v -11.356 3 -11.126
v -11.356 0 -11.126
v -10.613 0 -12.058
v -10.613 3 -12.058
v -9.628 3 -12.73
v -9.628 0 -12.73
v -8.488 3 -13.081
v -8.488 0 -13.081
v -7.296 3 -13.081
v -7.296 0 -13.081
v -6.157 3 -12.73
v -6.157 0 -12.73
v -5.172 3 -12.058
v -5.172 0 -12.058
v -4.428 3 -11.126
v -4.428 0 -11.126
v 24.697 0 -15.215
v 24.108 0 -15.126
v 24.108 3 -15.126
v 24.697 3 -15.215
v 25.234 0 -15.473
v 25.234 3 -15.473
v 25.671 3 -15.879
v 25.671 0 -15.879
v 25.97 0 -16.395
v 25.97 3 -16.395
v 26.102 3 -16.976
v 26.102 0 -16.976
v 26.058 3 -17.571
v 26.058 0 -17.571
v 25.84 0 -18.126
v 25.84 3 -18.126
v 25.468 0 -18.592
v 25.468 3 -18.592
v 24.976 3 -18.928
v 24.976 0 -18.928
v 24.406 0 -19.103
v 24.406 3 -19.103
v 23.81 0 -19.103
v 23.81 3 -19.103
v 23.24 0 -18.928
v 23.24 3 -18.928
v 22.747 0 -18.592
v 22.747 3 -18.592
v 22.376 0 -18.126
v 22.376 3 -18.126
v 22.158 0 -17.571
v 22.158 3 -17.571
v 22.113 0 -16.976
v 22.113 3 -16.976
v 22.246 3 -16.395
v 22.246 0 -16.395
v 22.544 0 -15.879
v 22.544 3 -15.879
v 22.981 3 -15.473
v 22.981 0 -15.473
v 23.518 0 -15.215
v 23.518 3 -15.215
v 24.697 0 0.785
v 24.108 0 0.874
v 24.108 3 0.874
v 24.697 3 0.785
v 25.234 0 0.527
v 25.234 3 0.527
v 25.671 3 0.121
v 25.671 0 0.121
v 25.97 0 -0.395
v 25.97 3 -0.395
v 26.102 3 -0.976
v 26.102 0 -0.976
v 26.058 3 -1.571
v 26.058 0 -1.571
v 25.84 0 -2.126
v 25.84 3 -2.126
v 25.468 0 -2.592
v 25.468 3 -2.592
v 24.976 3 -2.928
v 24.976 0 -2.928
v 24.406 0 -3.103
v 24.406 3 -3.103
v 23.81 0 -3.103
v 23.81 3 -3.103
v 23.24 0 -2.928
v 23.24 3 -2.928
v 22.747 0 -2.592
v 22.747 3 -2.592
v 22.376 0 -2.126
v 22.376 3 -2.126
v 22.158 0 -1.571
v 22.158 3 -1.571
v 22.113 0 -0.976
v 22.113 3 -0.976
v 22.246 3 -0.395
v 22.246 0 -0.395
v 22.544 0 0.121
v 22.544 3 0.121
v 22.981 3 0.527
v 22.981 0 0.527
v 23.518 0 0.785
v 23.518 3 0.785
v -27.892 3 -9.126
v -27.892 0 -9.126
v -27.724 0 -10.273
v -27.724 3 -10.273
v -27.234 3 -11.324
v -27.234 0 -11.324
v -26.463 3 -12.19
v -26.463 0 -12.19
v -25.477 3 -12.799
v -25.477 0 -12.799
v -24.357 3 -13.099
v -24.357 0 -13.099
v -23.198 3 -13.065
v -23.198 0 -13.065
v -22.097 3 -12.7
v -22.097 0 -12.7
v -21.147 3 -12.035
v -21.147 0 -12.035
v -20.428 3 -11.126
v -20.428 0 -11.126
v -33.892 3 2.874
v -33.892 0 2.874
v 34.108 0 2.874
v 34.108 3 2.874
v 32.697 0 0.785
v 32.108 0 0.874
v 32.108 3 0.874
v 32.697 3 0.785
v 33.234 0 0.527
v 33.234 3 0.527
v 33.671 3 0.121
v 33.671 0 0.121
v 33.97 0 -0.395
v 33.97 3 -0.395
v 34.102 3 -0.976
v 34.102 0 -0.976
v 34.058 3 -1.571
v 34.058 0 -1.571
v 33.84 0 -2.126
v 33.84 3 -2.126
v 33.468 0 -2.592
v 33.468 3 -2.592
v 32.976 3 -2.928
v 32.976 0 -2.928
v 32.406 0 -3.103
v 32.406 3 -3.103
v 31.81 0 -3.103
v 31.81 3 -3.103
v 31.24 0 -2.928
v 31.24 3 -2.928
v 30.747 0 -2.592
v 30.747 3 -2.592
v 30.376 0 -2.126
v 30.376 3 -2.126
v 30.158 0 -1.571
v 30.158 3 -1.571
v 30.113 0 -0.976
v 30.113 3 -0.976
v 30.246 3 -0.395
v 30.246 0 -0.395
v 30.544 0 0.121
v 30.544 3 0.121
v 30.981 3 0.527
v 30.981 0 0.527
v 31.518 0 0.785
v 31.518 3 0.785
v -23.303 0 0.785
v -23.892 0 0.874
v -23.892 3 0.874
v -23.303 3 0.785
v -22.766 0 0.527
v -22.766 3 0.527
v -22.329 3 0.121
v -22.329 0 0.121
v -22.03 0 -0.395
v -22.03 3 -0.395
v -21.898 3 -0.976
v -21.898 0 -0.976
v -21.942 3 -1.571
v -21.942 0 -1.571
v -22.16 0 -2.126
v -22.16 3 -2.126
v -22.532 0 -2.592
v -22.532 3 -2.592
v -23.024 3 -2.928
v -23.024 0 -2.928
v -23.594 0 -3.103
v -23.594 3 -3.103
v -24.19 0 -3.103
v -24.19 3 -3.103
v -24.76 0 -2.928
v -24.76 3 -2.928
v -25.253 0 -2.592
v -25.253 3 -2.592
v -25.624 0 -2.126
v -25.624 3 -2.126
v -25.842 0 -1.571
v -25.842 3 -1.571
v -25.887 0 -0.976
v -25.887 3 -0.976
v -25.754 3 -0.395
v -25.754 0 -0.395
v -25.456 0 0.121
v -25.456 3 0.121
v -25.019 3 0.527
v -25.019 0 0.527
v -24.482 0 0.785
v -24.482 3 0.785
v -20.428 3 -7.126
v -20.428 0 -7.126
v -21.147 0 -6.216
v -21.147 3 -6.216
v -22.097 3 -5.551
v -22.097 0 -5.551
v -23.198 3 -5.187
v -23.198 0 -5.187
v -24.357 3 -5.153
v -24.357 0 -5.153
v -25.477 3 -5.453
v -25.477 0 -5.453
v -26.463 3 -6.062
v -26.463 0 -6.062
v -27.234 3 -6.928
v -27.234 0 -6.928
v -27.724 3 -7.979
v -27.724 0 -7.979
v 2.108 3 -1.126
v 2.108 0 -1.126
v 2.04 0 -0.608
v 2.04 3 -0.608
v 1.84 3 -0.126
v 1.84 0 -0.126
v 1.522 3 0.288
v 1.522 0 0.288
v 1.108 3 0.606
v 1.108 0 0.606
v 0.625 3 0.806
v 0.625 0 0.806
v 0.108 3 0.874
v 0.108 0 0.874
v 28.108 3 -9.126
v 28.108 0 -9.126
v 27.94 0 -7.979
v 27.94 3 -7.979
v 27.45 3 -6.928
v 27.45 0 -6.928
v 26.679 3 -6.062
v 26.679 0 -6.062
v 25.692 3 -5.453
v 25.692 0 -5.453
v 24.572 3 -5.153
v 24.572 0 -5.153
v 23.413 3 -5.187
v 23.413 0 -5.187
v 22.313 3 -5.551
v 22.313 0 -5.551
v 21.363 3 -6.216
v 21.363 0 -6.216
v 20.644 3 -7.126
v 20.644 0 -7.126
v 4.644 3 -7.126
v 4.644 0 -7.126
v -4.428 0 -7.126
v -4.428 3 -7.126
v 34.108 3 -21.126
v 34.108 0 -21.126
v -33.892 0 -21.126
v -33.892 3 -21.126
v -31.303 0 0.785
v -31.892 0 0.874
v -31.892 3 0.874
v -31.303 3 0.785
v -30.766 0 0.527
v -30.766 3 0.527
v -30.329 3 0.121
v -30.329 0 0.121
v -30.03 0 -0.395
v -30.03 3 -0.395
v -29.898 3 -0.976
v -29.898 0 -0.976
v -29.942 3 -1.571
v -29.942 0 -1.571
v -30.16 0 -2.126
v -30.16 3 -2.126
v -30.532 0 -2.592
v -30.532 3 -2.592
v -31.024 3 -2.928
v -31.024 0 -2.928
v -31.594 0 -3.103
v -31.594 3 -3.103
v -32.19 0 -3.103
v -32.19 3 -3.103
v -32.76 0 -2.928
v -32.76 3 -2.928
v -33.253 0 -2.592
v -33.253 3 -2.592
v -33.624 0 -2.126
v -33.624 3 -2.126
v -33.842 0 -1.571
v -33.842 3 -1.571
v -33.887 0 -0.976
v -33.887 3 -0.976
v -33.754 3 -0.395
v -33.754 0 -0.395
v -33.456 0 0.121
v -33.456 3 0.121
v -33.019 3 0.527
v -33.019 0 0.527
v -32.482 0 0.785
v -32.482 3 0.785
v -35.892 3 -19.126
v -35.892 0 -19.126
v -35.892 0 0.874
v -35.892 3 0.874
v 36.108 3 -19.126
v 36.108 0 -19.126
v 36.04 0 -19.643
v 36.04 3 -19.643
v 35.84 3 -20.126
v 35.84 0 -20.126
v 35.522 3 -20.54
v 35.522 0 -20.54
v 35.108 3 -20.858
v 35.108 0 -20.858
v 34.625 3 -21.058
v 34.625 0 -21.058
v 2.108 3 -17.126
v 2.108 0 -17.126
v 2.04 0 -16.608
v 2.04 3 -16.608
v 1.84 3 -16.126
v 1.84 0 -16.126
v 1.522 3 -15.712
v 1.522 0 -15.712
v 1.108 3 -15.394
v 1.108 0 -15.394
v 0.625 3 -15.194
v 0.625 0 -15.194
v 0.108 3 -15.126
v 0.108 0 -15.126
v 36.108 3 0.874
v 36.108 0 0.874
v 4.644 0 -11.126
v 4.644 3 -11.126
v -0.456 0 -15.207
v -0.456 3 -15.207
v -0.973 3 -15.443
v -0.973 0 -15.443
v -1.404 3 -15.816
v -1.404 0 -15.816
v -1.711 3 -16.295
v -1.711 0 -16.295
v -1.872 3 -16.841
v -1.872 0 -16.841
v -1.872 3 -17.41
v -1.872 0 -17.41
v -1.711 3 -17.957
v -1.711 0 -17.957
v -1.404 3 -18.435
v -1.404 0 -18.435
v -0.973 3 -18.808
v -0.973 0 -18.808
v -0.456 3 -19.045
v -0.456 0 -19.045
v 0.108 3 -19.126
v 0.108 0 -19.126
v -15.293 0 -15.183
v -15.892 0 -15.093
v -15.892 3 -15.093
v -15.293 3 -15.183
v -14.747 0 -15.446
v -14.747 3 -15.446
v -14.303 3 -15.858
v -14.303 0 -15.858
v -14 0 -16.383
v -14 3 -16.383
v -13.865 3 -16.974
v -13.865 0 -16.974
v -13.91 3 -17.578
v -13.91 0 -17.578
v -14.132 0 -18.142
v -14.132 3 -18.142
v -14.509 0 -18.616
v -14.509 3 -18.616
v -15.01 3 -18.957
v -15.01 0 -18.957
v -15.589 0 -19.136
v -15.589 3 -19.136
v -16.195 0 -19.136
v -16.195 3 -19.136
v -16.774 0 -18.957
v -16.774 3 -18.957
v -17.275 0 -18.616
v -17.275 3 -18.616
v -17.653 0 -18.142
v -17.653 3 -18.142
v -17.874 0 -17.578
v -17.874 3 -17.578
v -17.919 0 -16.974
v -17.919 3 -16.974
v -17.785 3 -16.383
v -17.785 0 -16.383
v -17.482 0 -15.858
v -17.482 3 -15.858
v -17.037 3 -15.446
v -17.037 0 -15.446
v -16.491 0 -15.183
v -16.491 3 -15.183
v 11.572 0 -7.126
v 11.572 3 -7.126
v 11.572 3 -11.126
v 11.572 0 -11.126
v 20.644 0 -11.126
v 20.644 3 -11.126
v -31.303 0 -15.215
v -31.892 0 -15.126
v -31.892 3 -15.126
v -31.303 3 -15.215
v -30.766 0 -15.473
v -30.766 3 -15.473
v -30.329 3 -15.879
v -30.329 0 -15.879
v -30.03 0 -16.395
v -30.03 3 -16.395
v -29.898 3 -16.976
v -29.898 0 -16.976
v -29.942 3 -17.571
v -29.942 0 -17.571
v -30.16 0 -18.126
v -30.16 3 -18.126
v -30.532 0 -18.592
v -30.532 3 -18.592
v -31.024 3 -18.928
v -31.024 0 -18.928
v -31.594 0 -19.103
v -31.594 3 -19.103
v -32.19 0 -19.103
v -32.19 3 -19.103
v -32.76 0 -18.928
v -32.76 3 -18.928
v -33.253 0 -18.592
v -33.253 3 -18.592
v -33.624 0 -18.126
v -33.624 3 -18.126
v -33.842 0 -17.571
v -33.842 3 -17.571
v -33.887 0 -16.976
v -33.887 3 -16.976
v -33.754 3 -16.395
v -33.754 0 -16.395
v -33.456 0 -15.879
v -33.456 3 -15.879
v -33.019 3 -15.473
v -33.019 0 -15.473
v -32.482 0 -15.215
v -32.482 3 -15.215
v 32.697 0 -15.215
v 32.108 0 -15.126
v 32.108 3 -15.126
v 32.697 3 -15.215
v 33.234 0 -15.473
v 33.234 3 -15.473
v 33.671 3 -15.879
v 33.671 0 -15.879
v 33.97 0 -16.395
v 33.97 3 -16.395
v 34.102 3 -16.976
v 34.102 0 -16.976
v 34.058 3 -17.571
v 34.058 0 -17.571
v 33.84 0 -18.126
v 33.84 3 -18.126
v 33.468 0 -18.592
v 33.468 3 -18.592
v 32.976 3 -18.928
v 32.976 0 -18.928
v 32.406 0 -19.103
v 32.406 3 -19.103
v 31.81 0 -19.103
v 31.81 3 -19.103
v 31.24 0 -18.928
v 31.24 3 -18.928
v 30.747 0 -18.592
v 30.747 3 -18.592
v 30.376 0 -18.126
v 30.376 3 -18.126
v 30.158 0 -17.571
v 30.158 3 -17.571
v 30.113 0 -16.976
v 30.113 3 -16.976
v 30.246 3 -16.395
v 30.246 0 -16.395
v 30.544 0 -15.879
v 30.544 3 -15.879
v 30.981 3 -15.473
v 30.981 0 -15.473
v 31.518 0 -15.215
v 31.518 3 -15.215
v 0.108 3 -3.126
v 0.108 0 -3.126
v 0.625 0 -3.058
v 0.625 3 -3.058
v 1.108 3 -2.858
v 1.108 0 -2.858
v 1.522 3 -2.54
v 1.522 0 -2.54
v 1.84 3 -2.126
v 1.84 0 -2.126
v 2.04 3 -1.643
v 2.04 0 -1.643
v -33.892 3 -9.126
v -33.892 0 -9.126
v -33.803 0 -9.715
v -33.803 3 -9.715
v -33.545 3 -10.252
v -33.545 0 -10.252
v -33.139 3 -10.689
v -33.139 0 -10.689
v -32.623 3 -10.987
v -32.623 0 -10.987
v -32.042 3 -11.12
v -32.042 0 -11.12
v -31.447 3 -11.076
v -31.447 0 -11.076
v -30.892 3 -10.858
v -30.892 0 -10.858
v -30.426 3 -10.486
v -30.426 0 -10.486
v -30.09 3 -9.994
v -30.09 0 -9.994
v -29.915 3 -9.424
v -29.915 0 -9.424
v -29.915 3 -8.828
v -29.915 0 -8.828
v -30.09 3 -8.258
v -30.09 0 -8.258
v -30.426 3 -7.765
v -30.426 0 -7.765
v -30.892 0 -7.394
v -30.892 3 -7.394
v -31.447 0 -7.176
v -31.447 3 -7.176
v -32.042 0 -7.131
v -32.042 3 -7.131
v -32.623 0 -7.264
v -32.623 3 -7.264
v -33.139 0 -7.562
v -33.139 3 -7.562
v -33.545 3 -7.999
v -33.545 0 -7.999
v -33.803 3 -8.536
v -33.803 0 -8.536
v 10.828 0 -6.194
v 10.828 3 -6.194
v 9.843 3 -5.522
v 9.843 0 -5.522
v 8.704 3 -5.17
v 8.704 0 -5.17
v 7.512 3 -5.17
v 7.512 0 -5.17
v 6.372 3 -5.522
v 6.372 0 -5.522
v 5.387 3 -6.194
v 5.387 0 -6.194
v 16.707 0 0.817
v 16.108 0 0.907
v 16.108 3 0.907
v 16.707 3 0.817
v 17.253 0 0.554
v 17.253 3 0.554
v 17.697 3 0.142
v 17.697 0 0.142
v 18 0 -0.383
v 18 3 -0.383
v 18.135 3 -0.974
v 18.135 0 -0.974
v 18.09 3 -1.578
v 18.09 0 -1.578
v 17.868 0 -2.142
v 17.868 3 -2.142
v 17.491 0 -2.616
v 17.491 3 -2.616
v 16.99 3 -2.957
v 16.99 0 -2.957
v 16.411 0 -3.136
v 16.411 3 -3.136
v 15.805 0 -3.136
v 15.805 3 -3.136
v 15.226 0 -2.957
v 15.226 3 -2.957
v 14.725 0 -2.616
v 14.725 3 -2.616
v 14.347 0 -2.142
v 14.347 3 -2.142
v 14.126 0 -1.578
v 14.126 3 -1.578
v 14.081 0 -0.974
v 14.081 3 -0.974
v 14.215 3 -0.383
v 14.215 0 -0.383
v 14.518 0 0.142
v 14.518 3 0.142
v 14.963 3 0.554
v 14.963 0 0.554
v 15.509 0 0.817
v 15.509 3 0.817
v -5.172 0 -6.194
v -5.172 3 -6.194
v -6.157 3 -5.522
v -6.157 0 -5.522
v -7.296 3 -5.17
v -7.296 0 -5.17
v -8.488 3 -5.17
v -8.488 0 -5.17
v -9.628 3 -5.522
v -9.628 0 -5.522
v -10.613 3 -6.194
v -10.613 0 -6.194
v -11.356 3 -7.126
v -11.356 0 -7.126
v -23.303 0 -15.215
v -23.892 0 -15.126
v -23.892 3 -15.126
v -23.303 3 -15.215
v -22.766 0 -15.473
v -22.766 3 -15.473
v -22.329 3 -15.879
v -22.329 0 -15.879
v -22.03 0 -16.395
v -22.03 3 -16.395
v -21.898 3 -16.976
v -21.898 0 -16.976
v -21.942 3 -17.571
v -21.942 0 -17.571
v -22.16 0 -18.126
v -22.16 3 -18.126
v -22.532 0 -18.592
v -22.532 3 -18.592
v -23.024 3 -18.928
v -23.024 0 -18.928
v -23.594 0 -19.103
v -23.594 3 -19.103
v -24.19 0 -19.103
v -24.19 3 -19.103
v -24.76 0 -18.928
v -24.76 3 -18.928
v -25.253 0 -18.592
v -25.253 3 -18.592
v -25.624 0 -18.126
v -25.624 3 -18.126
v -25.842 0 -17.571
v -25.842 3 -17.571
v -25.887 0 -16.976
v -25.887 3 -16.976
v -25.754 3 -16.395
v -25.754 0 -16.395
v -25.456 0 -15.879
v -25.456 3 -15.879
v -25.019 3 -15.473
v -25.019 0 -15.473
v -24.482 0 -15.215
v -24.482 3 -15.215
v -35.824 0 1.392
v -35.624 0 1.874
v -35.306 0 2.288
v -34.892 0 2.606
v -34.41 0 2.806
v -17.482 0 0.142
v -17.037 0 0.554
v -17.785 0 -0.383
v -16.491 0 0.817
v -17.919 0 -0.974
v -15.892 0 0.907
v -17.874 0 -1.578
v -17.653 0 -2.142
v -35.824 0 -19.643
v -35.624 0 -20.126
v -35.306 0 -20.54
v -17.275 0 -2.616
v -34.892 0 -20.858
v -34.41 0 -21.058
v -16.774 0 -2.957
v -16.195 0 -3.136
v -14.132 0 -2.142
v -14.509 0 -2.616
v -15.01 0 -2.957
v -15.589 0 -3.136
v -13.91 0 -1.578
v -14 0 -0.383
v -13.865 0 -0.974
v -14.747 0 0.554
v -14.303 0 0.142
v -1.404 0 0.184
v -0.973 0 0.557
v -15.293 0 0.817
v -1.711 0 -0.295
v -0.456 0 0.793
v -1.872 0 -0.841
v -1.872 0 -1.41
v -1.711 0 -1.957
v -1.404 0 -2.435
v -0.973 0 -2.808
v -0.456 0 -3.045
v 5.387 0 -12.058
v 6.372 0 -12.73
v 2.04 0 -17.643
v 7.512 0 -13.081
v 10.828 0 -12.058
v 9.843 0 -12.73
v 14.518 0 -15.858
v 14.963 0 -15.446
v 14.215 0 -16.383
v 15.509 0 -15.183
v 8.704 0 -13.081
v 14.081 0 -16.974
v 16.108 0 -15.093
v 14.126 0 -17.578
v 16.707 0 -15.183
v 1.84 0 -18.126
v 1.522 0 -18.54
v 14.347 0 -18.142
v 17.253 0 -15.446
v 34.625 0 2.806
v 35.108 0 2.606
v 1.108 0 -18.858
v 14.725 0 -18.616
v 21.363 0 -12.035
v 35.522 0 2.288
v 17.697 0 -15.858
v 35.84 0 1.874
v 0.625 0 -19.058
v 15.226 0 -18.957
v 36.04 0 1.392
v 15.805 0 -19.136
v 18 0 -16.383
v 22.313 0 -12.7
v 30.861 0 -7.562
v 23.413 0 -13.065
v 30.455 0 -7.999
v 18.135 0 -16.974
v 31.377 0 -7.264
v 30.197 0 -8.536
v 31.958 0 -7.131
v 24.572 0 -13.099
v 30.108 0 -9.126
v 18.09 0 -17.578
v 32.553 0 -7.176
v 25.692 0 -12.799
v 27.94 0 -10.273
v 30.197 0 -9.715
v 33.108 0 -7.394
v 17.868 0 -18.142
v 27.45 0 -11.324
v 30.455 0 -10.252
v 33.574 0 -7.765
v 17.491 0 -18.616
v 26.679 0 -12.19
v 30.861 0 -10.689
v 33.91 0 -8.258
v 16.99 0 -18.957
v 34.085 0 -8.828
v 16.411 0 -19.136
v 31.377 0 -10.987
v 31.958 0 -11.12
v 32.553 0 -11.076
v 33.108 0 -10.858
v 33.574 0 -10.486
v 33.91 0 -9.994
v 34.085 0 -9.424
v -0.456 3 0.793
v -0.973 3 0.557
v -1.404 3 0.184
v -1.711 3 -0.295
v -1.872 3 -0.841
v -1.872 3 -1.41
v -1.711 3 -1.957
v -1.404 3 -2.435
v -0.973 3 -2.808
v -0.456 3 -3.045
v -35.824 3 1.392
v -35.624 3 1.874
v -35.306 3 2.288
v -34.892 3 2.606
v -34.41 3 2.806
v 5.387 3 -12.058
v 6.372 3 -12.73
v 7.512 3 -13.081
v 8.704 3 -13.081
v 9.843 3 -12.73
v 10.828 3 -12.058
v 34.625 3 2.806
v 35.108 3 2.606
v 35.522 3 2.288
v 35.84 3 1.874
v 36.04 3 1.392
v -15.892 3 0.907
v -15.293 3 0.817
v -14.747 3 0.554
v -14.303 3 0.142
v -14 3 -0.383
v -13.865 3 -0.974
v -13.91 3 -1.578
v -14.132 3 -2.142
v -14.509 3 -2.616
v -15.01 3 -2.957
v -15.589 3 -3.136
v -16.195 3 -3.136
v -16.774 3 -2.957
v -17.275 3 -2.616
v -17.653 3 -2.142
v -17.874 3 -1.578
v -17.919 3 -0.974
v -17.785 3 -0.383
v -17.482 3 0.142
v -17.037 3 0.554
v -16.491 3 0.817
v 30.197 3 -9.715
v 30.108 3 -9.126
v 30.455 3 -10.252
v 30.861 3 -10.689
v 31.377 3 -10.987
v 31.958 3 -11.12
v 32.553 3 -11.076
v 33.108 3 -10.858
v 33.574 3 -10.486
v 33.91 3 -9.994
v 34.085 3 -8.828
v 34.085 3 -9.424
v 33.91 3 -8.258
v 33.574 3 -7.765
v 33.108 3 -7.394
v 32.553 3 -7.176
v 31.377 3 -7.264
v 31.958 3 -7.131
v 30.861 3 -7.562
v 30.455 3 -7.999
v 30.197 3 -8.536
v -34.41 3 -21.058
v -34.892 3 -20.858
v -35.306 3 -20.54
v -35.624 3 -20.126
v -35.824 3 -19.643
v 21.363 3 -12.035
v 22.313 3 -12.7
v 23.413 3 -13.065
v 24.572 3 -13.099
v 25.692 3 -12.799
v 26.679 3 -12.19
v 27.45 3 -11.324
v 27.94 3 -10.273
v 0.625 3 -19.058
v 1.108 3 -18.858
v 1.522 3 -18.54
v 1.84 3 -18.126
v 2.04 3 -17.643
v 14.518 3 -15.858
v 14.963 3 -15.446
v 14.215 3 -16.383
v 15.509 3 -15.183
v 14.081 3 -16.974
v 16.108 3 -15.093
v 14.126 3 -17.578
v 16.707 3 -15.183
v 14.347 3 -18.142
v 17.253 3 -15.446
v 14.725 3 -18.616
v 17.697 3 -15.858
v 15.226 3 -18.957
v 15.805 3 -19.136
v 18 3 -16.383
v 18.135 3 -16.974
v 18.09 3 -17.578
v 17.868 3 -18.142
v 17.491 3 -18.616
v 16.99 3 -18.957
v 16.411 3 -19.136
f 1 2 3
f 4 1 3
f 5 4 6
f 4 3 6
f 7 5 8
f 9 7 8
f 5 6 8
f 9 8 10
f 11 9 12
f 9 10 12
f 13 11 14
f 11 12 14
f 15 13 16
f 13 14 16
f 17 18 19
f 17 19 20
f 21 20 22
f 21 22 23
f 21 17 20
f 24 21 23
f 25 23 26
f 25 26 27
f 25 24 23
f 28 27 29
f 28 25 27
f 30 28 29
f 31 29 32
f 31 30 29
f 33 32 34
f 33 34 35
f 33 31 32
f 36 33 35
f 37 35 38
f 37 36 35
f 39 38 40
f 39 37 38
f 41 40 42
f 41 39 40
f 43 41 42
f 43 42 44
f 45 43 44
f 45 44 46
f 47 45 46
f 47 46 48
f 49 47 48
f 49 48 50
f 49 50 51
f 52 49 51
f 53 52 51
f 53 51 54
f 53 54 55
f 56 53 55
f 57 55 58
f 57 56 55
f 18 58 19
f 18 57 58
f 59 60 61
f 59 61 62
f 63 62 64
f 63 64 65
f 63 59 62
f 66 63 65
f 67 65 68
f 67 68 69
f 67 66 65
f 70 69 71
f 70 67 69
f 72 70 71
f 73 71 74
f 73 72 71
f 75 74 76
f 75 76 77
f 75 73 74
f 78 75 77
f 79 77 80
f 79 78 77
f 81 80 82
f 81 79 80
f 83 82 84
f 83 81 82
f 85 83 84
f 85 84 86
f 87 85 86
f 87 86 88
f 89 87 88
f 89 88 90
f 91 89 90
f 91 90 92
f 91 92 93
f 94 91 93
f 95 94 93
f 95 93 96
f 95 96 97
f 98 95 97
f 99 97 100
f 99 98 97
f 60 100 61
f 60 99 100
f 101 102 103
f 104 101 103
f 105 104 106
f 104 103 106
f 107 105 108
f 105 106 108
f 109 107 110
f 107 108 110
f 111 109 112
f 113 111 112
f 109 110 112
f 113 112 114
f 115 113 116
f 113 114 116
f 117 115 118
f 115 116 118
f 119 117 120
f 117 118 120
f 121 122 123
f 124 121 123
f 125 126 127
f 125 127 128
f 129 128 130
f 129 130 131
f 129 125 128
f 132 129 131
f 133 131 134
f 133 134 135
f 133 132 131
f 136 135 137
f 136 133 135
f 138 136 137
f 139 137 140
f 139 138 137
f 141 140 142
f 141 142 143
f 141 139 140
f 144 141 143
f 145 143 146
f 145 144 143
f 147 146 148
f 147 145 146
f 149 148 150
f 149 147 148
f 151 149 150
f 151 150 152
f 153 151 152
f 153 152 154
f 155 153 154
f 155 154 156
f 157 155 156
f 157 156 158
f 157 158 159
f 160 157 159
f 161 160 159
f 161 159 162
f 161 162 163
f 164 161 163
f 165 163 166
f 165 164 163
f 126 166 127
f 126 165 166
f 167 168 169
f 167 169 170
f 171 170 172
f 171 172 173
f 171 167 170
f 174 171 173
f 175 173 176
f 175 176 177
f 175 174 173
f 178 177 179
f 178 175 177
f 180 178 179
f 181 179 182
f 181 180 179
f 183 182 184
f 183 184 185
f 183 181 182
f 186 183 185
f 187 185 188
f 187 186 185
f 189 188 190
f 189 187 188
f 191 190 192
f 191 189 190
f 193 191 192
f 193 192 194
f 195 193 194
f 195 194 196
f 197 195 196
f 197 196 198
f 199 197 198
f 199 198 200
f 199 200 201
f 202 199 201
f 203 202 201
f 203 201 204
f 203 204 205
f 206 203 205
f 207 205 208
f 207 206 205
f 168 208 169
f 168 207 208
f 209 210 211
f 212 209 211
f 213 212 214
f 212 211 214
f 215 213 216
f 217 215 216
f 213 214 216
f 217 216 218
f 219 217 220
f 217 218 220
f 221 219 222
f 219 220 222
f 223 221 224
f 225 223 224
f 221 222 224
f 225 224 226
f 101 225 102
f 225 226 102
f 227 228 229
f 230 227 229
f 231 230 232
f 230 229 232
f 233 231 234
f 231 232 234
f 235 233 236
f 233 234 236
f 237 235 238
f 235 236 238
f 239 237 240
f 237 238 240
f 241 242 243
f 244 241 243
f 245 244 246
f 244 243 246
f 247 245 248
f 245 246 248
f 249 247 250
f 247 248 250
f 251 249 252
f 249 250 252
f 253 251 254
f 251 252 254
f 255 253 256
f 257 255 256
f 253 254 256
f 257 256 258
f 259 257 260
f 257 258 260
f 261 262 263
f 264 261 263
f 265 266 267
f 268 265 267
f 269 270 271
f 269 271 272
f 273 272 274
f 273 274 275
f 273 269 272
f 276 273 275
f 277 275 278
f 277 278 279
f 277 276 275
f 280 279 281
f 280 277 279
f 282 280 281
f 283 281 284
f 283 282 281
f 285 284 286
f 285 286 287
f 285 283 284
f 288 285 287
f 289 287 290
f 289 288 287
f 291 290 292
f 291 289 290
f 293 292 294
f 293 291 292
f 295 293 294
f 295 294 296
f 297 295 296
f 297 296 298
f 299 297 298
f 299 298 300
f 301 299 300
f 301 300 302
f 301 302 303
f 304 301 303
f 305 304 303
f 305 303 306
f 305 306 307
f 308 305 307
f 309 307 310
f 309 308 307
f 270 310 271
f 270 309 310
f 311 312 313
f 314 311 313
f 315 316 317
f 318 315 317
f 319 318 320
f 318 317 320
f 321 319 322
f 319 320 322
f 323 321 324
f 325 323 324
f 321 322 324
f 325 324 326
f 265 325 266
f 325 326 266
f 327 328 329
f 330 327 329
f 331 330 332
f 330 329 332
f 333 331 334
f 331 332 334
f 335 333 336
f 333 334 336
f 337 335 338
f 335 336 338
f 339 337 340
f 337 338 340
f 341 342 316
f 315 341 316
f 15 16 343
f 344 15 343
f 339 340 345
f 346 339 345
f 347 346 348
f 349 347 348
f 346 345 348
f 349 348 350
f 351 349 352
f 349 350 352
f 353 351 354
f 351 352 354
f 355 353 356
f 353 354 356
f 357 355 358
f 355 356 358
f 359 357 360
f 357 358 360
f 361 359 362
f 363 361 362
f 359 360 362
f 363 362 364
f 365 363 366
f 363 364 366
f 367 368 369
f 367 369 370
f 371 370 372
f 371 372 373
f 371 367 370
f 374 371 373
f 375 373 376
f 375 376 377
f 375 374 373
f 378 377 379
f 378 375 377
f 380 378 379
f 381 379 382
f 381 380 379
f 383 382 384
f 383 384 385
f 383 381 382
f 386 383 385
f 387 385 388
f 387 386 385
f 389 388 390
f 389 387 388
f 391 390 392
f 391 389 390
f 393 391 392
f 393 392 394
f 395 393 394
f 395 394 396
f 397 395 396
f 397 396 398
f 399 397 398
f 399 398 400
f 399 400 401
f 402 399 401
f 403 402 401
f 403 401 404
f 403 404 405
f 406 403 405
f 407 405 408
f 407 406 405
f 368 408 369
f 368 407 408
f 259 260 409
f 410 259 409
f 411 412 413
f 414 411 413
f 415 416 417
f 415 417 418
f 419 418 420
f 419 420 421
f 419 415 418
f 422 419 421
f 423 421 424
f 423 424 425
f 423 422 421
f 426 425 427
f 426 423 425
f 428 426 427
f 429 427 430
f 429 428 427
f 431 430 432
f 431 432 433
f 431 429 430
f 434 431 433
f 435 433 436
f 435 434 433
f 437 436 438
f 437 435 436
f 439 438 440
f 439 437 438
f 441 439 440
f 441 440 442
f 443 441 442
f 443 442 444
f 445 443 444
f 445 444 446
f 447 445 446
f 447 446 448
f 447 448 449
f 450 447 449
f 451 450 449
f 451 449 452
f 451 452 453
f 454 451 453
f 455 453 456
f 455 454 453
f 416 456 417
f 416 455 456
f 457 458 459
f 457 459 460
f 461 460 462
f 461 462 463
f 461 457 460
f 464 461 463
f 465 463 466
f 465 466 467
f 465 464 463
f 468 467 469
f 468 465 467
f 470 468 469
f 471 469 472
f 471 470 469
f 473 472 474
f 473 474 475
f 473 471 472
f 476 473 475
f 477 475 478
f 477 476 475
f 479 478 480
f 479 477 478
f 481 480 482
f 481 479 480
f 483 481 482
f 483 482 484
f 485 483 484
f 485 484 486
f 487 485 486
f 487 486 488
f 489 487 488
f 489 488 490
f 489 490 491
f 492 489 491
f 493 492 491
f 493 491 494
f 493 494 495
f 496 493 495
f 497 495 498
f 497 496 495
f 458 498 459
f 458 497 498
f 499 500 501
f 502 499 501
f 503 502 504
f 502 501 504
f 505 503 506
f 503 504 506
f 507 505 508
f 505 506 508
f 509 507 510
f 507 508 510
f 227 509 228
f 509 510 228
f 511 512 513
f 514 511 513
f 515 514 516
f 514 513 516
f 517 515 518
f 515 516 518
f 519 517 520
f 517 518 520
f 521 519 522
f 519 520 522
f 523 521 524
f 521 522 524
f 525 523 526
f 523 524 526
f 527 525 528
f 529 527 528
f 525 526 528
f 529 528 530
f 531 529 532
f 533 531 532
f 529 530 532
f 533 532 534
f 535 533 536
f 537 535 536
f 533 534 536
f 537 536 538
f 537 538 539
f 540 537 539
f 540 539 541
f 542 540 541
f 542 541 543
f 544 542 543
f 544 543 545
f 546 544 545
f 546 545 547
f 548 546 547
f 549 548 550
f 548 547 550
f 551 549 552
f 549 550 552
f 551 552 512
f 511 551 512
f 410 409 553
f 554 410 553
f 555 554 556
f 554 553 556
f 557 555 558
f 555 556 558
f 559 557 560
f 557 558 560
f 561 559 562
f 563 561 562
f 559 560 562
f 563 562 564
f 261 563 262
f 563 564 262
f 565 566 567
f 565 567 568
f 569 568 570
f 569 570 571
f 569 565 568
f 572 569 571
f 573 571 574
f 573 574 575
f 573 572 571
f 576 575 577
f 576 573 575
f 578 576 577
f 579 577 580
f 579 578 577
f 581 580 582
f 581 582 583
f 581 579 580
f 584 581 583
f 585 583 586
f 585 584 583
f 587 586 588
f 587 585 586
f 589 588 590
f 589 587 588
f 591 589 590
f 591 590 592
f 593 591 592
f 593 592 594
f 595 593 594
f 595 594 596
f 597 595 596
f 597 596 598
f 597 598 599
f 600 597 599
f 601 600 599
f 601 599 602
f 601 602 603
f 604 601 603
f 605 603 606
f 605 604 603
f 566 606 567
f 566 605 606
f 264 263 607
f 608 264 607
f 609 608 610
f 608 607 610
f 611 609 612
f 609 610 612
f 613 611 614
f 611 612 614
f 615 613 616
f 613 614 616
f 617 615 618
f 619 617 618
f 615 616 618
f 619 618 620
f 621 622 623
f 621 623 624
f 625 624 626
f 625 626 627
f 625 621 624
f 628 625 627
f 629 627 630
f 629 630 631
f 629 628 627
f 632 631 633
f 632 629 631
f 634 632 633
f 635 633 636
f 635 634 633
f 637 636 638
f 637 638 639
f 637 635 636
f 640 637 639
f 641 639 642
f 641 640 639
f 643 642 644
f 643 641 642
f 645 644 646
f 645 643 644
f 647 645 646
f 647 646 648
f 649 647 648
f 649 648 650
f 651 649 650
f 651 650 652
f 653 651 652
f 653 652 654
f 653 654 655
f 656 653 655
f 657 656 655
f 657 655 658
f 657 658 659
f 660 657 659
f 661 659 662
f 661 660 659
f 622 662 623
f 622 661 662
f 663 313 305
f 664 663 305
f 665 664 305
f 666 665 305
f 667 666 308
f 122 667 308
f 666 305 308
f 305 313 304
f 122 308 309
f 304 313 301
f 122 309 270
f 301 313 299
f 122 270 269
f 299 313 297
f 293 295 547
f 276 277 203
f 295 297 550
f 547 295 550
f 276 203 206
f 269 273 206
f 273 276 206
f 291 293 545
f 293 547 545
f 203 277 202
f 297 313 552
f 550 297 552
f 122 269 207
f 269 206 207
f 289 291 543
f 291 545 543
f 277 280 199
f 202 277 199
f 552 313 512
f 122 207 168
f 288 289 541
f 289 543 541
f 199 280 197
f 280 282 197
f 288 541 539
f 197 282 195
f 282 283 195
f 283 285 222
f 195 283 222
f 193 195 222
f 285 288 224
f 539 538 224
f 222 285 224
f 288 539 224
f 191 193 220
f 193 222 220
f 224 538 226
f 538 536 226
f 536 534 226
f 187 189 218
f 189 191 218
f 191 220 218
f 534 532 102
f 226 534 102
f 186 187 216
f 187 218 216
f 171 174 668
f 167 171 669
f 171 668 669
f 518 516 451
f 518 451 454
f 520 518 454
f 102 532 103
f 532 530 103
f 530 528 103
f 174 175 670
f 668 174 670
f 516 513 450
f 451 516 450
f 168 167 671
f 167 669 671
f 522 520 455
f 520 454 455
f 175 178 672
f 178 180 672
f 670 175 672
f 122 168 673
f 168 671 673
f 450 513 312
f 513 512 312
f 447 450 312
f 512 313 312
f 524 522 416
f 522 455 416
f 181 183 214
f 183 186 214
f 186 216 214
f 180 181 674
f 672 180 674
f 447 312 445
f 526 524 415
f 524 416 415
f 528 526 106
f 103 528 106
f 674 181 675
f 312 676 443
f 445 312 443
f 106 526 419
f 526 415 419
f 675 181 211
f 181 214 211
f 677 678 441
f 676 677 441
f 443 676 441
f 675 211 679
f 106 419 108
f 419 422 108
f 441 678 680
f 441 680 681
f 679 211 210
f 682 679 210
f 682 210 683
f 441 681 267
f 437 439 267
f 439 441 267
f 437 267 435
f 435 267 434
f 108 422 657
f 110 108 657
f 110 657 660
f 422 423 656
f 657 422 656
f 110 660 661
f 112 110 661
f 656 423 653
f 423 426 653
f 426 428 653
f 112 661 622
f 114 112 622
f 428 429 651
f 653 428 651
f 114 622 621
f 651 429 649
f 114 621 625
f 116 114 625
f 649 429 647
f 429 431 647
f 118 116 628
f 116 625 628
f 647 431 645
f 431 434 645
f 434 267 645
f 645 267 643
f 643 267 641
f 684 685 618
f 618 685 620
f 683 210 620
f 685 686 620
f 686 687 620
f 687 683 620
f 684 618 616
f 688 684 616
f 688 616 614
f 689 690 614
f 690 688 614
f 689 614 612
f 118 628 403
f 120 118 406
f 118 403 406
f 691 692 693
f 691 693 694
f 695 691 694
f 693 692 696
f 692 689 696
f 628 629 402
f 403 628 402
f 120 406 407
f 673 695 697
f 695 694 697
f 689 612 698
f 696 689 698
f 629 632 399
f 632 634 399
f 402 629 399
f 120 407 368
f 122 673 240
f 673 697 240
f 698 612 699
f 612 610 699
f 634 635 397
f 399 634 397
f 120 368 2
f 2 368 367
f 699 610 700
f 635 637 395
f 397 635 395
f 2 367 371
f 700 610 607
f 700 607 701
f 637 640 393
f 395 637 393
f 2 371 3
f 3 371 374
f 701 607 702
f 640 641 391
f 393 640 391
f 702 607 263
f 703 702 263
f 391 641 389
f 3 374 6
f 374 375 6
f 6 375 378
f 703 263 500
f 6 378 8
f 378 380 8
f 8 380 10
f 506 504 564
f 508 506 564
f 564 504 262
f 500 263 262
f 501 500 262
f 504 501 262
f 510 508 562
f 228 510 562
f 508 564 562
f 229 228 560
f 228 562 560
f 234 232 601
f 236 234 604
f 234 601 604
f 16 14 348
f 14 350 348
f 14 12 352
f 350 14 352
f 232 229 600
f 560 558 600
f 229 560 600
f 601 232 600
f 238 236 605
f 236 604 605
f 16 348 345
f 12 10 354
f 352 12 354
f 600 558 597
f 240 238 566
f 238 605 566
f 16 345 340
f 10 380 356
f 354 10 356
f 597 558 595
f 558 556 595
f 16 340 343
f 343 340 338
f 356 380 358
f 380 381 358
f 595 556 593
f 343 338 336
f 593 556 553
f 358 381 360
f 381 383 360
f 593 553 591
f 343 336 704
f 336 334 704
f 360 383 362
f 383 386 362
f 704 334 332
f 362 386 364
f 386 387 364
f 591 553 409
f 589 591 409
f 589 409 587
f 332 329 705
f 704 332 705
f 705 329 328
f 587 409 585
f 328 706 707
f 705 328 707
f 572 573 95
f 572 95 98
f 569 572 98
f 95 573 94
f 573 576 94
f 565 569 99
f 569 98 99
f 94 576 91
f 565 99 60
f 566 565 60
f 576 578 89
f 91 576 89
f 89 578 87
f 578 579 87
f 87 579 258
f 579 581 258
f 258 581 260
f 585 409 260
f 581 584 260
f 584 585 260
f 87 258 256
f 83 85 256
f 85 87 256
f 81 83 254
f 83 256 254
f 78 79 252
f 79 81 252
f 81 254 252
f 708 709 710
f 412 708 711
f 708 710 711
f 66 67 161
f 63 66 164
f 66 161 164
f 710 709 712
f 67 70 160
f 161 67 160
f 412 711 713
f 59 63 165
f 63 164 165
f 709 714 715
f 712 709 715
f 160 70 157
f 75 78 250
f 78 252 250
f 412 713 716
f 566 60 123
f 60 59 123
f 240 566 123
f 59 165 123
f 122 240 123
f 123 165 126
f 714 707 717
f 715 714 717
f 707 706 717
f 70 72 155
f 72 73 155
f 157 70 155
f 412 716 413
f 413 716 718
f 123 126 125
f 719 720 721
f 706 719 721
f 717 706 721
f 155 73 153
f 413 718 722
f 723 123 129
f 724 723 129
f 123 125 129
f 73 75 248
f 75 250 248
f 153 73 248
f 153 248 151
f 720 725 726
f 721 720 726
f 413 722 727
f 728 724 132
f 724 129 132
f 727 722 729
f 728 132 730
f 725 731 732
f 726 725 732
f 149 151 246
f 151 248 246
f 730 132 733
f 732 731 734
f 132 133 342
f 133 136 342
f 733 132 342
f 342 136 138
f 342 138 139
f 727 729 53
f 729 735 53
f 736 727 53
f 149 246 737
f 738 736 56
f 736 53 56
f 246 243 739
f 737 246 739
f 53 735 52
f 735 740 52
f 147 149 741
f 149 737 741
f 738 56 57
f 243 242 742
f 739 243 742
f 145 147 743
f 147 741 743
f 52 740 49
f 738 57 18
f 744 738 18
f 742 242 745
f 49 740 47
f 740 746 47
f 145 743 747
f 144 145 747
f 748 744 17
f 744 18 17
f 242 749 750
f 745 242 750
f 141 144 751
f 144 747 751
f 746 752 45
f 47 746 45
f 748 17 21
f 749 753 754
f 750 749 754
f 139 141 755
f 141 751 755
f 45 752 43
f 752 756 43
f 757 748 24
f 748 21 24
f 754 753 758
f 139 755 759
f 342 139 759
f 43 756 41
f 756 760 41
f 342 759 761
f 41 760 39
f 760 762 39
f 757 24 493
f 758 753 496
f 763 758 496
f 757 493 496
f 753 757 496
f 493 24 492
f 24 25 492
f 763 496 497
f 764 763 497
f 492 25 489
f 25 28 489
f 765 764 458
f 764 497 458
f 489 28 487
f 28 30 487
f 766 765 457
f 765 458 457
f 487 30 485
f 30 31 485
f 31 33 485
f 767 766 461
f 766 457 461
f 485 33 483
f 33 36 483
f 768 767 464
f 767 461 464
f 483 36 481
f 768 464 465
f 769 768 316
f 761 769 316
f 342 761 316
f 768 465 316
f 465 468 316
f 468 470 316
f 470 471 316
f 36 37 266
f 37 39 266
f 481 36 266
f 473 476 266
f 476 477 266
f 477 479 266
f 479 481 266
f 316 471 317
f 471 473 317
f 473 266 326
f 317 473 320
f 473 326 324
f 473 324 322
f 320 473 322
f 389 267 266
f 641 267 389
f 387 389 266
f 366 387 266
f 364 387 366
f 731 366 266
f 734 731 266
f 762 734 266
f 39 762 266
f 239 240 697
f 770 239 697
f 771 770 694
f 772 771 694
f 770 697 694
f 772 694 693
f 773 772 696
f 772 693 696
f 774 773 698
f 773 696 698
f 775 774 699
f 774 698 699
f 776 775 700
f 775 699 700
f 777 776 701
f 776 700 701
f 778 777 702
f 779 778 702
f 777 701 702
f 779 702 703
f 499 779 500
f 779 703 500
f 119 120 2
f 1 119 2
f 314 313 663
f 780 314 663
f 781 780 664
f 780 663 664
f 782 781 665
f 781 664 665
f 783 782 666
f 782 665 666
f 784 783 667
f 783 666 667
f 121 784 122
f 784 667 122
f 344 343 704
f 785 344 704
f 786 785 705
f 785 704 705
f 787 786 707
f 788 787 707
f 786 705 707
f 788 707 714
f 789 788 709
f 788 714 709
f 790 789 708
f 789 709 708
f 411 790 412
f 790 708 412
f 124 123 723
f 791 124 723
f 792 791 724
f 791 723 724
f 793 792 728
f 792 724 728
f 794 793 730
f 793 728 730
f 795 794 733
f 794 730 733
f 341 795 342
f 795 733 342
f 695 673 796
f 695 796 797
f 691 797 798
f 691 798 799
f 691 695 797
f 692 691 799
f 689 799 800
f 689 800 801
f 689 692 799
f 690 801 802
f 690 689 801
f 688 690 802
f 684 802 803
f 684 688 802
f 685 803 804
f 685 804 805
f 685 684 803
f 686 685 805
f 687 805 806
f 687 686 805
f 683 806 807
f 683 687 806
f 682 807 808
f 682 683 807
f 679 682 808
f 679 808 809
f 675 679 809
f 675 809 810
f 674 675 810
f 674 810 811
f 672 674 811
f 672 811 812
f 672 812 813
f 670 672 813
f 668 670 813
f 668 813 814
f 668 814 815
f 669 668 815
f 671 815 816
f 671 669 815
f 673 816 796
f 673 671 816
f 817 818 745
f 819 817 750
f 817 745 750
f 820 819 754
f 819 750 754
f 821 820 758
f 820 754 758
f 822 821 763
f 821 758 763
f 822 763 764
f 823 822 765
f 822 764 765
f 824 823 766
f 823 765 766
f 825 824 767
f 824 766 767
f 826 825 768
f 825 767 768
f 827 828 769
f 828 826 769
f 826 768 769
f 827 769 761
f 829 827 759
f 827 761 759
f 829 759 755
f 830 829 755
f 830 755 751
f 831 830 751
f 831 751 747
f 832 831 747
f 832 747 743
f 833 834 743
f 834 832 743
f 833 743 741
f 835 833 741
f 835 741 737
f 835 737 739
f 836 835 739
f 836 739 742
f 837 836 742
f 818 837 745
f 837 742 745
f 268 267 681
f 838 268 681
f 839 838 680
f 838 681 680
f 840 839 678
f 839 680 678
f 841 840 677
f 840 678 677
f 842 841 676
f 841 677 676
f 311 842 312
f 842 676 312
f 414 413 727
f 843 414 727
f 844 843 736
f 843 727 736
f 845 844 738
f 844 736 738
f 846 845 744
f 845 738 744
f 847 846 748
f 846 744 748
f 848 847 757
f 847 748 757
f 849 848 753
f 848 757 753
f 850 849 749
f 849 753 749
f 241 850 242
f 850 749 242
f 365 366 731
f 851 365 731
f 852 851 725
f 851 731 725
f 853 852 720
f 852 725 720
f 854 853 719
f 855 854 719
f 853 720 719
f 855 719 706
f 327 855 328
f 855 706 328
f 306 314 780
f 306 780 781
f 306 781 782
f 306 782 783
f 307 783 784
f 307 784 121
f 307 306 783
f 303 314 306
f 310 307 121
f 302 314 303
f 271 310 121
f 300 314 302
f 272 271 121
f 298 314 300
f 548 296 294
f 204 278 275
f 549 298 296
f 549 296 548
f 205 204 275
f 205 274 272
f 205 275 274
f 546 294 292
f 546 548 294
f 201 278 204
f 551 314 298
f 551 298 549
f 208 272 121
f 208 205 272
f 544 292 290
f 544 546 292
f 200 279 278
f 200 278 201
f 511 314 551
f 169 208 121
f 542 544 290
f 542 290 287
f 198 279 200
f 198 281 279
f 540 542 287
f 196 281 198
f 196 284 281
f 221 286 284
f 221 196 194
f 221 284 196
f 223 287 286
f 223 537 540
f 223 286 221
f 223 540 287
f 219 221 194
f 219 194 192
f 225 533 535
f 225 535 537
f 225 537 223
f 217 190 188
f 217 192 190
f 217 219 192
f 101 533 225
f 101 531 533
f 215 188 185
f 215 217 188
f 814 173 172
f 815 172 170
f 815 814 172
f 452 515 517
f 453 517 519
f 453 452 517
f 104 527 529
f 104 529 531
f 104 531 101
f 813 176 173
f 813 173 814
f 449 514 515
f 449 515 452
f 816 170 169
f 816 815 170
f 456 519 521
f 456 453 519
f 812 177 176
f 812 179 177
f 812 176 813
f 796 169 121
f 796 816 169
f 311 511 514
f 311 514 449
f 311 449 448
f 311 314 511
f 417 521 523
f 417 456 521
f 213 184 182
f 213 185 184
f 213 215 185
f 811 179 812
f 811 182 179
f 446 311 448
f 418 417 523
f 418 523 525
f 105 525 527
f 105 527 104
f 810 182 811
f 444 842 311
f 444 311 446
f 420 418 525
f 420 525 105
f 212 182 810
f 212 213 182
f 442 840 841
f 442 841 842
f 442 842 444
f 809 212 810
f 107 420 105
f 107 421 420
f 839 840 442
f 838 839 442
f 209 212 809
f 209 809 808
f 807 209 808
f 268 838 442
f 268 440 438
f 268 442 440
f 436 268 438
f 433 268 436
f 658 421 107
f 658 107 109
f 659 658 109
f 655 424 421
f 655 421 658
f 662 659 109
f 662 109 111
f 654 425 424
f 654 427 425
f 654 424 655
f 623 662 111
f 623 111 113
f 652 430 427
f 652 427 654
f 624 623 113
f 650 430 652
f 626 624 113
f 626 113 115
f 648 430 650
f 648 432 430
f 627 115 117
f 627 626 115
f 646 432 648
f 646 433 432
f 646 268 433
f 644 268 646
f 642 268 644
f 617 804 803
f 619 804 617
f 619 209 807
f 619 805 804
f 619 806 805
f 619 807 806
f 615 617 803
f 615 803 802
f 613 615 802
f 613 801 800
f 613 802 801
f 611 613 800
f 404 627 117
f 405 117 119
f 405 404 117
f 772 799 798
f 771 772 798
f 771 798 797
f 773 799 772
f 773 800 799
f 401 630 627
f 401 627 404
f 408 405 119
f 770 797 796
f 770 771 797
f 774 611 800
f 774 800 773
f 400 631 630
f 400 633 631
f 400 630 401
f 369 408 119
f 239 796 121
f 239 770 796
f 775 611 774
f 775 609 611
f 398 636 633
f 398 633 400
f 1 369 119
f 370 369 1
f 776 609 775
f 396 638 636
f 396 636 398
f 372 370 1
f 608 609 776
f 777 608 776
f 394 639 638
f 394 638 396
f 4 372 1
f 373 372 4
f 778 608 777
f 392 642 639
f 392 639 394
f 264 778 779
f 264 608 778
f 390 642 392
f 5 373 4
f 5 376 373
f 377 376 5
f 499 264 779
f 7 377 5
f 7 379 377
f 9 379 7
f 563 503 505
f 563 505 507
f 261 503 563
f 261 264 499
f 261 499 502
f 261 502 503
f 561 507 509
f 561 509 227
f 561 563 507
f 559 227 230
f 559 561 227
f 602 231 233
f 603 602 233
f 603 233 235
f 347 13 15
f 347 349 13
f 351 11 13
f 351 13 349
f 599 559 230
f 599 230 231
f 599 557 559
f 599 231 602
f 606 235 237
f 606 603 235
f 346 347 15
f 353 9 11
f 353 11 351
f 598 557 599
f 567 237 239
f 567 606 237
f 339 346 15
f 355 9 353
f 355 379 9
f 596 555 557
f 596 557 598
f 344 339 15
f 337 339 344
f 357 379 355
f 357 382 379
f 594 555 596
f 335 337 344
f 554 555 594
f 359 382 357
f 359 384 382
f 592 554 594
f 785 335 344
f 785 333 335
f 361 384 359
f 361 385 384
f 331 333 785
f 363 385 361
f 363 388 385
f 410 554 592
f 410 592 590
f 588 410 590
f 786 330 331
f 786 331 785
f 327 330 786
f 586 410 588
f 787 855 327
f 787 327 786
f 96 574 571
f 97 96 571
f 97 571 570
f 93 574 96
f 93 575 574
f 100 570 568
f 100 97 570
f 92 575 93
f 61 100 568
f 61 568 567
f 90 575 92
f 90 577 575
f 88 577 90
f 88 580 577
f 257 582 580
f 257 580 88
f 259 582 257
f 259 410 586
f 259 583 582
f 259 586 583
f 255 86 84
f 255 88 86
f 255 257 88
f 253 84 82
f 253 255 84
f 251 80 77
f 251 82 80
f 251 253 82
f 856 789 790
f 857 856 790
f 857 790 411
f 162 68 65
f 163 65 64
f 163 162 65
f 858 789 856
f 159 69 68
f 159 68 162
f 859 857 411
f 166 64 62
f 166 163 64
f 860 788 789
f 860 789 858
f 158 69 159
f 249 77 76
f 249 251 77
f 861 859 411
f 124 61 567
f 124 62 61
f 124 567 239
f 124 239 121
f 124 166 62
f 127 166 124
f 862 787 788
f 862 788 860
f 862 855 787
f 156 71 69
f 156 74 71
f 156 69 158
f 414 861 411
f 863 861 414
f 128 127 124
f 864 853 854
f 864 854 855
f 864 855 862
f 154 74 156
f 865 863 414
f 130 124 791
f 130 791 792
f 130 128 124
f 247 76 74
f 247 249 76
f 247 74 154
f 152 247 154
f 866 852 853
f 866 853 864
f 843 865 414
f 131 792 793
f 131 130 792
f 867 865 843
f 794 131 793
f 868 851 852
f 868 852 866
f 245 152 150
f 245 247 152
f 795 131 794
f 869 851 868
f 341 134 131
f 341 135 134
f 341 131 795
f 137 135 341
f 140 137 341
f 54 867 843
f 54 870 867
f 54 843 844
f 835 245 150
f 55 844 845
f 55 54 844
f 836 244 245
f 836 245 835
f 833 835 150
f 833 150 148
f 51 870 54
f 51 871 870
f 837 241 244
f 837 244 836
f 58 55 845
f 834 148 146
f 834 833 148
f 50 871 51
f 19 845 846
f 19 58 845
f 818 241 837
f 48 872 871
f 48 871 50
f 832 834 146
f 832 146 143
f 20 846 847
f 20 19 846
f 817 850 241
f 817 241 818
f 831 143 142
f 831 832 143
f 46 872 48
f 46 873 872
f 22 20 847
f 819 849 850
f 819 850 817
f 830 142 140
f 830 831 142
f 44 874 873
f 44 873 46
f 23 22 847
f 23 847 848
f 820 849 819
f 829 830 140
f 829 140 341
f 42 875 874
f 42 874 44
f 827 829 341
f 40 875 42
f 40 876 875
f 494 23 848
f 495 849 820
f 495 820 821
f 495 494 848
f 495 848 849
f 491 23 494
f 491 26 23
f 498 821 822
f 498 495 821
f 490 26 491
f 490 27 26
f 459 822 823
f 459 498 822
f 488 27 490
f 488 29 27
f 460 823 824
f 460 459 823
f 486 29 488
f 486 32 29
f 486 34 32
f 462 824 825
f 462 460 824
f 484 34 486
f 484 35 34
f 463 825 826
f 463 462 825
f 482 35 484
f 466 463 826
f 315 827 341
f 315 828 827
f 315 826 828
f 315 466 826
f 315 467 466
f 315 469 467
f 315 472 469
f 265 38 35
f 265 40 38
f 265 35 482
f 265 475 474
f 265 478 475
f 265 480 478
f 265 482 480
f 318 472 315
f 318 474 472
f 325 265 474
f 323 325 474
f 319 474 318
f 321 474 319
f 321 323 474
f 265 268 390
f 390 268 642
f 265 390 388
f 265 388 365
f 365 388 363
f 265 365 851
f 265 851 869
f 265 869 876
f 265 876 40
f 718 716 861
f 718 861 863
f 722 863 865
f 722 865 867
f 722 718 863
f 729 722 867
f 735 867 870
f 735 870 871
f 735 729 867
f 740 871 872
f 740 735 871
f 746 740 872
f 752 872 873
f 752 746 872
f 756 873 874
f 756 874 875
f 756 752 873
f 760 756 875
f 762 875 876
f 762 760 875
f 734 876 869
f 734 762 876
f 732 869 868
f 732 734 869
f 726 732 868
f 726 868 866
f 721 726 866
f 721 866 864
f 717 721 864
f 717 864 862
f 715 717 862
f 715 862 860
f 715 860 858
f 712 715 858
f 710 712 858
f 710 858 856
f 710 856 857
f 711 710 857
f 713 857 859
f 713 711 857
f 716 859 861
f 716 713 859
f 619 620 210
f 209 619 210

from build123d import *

# Parameters (mm, degrees)
SKETCH1_R           = 2
SKETCH1_R_2         = 2.032942559
BOSS_EXTRUDE2_DEPTH = 3


with BuildPart() as part:
    # Sketch1 → Boss-Extrude2 (new body)
    # profile 1 of 4: a face of its own
    with BuildSketch(Plane(origin=(0, 0, 0), x_dir=(1, 0, 0), z_dir=(0, 1, 0))):
        with BuildLine():
            Line((-33.892215569, -2.874251497), (0.107784431, -2.874251497))
            Line((0.107784431, -2.874251497), (0.107784431, -0.874251497))
            ThreePointArc((0.107784431, -0.874251497), (-1.892215569, 1.125748503), (0.107784431, 3.125748503))
            Line((0.107784431, 3.125748503), (0.107784431, 7.125748503))
            Line((0.107784431, 7.125748503), (-4.428113954, 7.125748503))
            ThreePointArc((-4.428113954, 7.125748503), (-7.892215569, 5.125748503), (-11.356317184, 7.125748503))
            Line((-11.356317184, 7.125748503), (-20.428113954, 7.125748503))
            ThreePointArc((-20.428113954, 7.125748503), (-24.927491749, 5.262045198), (-27.892215569, 9.125748503))
            Line((-27.892215569, 9.125748503), (-29.892215569, 9.125748503))
            ThreePointArc((-29.892215569, 9.125748503), (-31.892215569, 7.125748503), (-33.892215569, 9.125748503))
            Line((-33.892215569, 9.125748503), (-35.892215569, 9.125748503))
            Line((-35.892215569, 9.125748503), (-35.892215569, -0.874251497))
            ThreePointArc((-35.892215569, -0.874251497), (-35.306429131, -2.288465059), (-33.892215569, -2.874251497))
        make_face()
        with Locations(Location((-31.892215569, 1.125748503, 0), (0, 0, 270))):
            Circle(SKETCH1_R, mode=Mode.SUBTRACT)
        with Locations(Location((-23.892215569, 1.125748503, 0), (0, 0, 270))):
            Circle(SKETCH1_R, mode=Mode.SUBTRACT)
        with Locations(Location((-15.892215569, 1.125748503, 0), (0, 0, 270))):
            Circle(SKETCH1_R_2, mode=Mode.SUBTRACT)
    # profile 2 of 4: a face of its own
    with BuildSketch(Plane(origin=(0, 0, 0), x_dir=(1, 0, 0), z_dir=(0, 1, 0))):
        with BuildLine():
            Line((0.107784431, 19.125748503), (0.107784431, 21.125748503))
            Line((0.107784431, 21.125748503), (-33.892215569, 21.125748503))
            ThreePointArc((-33.892215569, 21.125748503), (-35.306429131, 20.539962065), (-35.892215569, 19.125748503))
            Line((-35.892215569, 19.125748503), (-35.892215569, 9.125748503))
            Line((-35.892215569, 9.125748503), (-33.892215569, 9.125748503))
            ThreePointArc((-33.892215569, 9.125748503), (-31.892215569, 11.125748503), (-29.892215569, 9.125748503))
            Line((-29.892215569, 9.125748503), (-27.892215569, 9.125748503))
            ThreePointArc((-27.892215569, 9.125748503), (-24.927491749, 12.989451808), (-20.428113954, 11.125748503))
            Line((-20.428113954, 11.125748503), (-11.356317184, 11.125748503))
            ThreePointArc((-11.356317184, 11.125748503), (-7.892215569, 13.125748503), (-4.428113954, 11.125748503))
            Line((-4.428113954, 11.125748503), (0.107784431, 11.125748503))
            Line((0.107784431, 11.125748503), (0.107784431, 15.125748503))
            ThreePointArc((0.107784431, 15.125748503), (-1.892215569, 17.125748503), (0.107784431, 19.125748503))
        make_face()
        with Locations(Location((-31.892215569, 17.125748503, 0), (0, 0, 270))):
            Circle(SKETCH1_R, mode=Mode.SUBTRACT)
        with Locations(Location((-23.892215569, 17.125748503, 0), (0, 0, 270))):
            Circle(SKETCH1_R, mode=Mode.SUBTRACT)
        with Locations(Location((-15.892215569, 17.125748503, 0), (0, 0, 270))):
            Circle(SKETCH1_R_2, mode=Mode.SUBTRACT)
    # profile 3 of 4: a face of its own
    with BuildSketch(Plane(origin=(0, 0, 0), x_dir=(1, 0, 0), z_dir=(0, 1, 0))):
        with BuildLine():
            Line((36.107784431, 9.125748503), (34.107784431, 9.125748503))
            ThreePointArc((34.107784431, 9.125748503), (32.107784431, 7.125748503), (30.107784431, 9.125748503))
            Line((30.107784431, 9.125748503), (28.107784431, 9.125748503))
            ThreePointArc((28.107784431, 9.125748503), (25.143060612, 5.262045198), (20.643682816, 7.125748503))
            Line((20.643682816, 7.125748503), (11.571886046, 7.125748503))
            ThreePointArc((11.571886046, 7.125748503), (8.107784431, 5.125748503), (4.643682816, 7.125748503))
            Line((4.643682816, 7.125748503), (0.107784431, 7.125748503))
            Line((0.107784431, 7.125748503), (0.107784431, 3.125748503))
            ThreePointArc((0.107784431, 3.125748503), (1.521997994, 2.539962065), (2.107784431, 1.125748503))
            ThreePointArc((2.107784431, 1.125748503), (1.521997994, -0.288465059), (0.107784431, -0.874251497))
            Line((0.107784431, -0.874251497), (0.107784431, -2.874251497))
            Line((0.107784431, -2.874251497), (34.107784431, -2.874251497))
            ThreePointArc((34.107784431, -2.874251497), (35.521997994, -2.288465059), (36.107784431, -0.874251497))
            Line((36.107784431, -0.874251497), (36.107784431, 9.125748503))
        make_face()
        with Locations(Location((16.107784431, 1.125748503, 0), (0, 0, 270))):
            Circle(SKETCH1_R_2, mode=Mode.SUBTRACT)
        with Locations(Location((24.107784431, 1.125748503, 0), (0, 0, 270))):
            Circle(SKETCH1_R, mode=Mode.SUBTRACT)
        with Locations(Location((32.107784431, 1.125748503, 0), (0, 0, 270))):
            Circle(SKETCH1_R, mode=Mode.SUBTRACT)
    # profile 4 of 4: a face of its own
    with BuildSketch(Plane(origin=(0, 0, 0), x_dir=(1, 0, 0), z_dir=(0, 1, 0))):
        with BuildLine():
            ThreePointArc((30.107784431, 9.125748503), (32.107784431, 11.125748503), (34.107784431, 9.125748503))
            Line((34.107784431, 9.125748503), (36.107784431, 9.125748503))
            Line((36.107784431, 9.125748503), (36.107784431, 19.125748503))
            ThreePointArc((36.107784431, 19.125748503), (35.521997994, 20.539962065), (34.107784431, 21.125748503))
            Line((34.107784431, 21.125748503), (0.107784431, 21.125748503))
            Line((0.107784431, 21.125748503), (0.107784431, 19.125748503))
            ThreePointArc((0.107784431, 19.125748503), (1.521997994, 18.539962065), (2.107784431, 17.125748503))
            ThreePointArc((2.107784431, 17.125748503), (1.521997994, 15.711534941), (0.107784431, 15.125748503))
            Line((0.107784431, 15.125748503), (0.107784431, 11.125748503))
            Line((0.107784431, 11.125748503), (4.643682816, 11.125748503))
            ThreePointArc((4.643682816, 11.125748503), (8.107784431, 13.125748503), (11.571886046, 11.125748503))
            Line((11.571886046, 11.125748503), (20.643682816, 11.125748503))
            ThreePointArc((20.643682816, 11.125748503), (25.143060612, 12.989451808), (28.107784431, 9.125748503))
            Line((28.107784431, 9.125748503), (30.107784431, 9.125748503))
        make_face()
        with Locations(Location((16.107784431, 17.125748503, 0), (0, 0, 270))):
            Circle(SKETCH1_R_2, mode=Mode.SUBTRACT)
        with Locations(Location((24.107784431, 17.125748503, 0), (0, 0, 270))):
            Circle(SKETCH1_R, mode=Mode.SUBTRACT)
        with Locations(Location((32.107784431, 17.125748503, 0), (0, 0, 270))):
            Circle(SKETCH1_R, mode=Mode.SUBTRACT)
    extrude(amount=BOSS_EXTRUDE2_DEPTH)


solid = part.part
